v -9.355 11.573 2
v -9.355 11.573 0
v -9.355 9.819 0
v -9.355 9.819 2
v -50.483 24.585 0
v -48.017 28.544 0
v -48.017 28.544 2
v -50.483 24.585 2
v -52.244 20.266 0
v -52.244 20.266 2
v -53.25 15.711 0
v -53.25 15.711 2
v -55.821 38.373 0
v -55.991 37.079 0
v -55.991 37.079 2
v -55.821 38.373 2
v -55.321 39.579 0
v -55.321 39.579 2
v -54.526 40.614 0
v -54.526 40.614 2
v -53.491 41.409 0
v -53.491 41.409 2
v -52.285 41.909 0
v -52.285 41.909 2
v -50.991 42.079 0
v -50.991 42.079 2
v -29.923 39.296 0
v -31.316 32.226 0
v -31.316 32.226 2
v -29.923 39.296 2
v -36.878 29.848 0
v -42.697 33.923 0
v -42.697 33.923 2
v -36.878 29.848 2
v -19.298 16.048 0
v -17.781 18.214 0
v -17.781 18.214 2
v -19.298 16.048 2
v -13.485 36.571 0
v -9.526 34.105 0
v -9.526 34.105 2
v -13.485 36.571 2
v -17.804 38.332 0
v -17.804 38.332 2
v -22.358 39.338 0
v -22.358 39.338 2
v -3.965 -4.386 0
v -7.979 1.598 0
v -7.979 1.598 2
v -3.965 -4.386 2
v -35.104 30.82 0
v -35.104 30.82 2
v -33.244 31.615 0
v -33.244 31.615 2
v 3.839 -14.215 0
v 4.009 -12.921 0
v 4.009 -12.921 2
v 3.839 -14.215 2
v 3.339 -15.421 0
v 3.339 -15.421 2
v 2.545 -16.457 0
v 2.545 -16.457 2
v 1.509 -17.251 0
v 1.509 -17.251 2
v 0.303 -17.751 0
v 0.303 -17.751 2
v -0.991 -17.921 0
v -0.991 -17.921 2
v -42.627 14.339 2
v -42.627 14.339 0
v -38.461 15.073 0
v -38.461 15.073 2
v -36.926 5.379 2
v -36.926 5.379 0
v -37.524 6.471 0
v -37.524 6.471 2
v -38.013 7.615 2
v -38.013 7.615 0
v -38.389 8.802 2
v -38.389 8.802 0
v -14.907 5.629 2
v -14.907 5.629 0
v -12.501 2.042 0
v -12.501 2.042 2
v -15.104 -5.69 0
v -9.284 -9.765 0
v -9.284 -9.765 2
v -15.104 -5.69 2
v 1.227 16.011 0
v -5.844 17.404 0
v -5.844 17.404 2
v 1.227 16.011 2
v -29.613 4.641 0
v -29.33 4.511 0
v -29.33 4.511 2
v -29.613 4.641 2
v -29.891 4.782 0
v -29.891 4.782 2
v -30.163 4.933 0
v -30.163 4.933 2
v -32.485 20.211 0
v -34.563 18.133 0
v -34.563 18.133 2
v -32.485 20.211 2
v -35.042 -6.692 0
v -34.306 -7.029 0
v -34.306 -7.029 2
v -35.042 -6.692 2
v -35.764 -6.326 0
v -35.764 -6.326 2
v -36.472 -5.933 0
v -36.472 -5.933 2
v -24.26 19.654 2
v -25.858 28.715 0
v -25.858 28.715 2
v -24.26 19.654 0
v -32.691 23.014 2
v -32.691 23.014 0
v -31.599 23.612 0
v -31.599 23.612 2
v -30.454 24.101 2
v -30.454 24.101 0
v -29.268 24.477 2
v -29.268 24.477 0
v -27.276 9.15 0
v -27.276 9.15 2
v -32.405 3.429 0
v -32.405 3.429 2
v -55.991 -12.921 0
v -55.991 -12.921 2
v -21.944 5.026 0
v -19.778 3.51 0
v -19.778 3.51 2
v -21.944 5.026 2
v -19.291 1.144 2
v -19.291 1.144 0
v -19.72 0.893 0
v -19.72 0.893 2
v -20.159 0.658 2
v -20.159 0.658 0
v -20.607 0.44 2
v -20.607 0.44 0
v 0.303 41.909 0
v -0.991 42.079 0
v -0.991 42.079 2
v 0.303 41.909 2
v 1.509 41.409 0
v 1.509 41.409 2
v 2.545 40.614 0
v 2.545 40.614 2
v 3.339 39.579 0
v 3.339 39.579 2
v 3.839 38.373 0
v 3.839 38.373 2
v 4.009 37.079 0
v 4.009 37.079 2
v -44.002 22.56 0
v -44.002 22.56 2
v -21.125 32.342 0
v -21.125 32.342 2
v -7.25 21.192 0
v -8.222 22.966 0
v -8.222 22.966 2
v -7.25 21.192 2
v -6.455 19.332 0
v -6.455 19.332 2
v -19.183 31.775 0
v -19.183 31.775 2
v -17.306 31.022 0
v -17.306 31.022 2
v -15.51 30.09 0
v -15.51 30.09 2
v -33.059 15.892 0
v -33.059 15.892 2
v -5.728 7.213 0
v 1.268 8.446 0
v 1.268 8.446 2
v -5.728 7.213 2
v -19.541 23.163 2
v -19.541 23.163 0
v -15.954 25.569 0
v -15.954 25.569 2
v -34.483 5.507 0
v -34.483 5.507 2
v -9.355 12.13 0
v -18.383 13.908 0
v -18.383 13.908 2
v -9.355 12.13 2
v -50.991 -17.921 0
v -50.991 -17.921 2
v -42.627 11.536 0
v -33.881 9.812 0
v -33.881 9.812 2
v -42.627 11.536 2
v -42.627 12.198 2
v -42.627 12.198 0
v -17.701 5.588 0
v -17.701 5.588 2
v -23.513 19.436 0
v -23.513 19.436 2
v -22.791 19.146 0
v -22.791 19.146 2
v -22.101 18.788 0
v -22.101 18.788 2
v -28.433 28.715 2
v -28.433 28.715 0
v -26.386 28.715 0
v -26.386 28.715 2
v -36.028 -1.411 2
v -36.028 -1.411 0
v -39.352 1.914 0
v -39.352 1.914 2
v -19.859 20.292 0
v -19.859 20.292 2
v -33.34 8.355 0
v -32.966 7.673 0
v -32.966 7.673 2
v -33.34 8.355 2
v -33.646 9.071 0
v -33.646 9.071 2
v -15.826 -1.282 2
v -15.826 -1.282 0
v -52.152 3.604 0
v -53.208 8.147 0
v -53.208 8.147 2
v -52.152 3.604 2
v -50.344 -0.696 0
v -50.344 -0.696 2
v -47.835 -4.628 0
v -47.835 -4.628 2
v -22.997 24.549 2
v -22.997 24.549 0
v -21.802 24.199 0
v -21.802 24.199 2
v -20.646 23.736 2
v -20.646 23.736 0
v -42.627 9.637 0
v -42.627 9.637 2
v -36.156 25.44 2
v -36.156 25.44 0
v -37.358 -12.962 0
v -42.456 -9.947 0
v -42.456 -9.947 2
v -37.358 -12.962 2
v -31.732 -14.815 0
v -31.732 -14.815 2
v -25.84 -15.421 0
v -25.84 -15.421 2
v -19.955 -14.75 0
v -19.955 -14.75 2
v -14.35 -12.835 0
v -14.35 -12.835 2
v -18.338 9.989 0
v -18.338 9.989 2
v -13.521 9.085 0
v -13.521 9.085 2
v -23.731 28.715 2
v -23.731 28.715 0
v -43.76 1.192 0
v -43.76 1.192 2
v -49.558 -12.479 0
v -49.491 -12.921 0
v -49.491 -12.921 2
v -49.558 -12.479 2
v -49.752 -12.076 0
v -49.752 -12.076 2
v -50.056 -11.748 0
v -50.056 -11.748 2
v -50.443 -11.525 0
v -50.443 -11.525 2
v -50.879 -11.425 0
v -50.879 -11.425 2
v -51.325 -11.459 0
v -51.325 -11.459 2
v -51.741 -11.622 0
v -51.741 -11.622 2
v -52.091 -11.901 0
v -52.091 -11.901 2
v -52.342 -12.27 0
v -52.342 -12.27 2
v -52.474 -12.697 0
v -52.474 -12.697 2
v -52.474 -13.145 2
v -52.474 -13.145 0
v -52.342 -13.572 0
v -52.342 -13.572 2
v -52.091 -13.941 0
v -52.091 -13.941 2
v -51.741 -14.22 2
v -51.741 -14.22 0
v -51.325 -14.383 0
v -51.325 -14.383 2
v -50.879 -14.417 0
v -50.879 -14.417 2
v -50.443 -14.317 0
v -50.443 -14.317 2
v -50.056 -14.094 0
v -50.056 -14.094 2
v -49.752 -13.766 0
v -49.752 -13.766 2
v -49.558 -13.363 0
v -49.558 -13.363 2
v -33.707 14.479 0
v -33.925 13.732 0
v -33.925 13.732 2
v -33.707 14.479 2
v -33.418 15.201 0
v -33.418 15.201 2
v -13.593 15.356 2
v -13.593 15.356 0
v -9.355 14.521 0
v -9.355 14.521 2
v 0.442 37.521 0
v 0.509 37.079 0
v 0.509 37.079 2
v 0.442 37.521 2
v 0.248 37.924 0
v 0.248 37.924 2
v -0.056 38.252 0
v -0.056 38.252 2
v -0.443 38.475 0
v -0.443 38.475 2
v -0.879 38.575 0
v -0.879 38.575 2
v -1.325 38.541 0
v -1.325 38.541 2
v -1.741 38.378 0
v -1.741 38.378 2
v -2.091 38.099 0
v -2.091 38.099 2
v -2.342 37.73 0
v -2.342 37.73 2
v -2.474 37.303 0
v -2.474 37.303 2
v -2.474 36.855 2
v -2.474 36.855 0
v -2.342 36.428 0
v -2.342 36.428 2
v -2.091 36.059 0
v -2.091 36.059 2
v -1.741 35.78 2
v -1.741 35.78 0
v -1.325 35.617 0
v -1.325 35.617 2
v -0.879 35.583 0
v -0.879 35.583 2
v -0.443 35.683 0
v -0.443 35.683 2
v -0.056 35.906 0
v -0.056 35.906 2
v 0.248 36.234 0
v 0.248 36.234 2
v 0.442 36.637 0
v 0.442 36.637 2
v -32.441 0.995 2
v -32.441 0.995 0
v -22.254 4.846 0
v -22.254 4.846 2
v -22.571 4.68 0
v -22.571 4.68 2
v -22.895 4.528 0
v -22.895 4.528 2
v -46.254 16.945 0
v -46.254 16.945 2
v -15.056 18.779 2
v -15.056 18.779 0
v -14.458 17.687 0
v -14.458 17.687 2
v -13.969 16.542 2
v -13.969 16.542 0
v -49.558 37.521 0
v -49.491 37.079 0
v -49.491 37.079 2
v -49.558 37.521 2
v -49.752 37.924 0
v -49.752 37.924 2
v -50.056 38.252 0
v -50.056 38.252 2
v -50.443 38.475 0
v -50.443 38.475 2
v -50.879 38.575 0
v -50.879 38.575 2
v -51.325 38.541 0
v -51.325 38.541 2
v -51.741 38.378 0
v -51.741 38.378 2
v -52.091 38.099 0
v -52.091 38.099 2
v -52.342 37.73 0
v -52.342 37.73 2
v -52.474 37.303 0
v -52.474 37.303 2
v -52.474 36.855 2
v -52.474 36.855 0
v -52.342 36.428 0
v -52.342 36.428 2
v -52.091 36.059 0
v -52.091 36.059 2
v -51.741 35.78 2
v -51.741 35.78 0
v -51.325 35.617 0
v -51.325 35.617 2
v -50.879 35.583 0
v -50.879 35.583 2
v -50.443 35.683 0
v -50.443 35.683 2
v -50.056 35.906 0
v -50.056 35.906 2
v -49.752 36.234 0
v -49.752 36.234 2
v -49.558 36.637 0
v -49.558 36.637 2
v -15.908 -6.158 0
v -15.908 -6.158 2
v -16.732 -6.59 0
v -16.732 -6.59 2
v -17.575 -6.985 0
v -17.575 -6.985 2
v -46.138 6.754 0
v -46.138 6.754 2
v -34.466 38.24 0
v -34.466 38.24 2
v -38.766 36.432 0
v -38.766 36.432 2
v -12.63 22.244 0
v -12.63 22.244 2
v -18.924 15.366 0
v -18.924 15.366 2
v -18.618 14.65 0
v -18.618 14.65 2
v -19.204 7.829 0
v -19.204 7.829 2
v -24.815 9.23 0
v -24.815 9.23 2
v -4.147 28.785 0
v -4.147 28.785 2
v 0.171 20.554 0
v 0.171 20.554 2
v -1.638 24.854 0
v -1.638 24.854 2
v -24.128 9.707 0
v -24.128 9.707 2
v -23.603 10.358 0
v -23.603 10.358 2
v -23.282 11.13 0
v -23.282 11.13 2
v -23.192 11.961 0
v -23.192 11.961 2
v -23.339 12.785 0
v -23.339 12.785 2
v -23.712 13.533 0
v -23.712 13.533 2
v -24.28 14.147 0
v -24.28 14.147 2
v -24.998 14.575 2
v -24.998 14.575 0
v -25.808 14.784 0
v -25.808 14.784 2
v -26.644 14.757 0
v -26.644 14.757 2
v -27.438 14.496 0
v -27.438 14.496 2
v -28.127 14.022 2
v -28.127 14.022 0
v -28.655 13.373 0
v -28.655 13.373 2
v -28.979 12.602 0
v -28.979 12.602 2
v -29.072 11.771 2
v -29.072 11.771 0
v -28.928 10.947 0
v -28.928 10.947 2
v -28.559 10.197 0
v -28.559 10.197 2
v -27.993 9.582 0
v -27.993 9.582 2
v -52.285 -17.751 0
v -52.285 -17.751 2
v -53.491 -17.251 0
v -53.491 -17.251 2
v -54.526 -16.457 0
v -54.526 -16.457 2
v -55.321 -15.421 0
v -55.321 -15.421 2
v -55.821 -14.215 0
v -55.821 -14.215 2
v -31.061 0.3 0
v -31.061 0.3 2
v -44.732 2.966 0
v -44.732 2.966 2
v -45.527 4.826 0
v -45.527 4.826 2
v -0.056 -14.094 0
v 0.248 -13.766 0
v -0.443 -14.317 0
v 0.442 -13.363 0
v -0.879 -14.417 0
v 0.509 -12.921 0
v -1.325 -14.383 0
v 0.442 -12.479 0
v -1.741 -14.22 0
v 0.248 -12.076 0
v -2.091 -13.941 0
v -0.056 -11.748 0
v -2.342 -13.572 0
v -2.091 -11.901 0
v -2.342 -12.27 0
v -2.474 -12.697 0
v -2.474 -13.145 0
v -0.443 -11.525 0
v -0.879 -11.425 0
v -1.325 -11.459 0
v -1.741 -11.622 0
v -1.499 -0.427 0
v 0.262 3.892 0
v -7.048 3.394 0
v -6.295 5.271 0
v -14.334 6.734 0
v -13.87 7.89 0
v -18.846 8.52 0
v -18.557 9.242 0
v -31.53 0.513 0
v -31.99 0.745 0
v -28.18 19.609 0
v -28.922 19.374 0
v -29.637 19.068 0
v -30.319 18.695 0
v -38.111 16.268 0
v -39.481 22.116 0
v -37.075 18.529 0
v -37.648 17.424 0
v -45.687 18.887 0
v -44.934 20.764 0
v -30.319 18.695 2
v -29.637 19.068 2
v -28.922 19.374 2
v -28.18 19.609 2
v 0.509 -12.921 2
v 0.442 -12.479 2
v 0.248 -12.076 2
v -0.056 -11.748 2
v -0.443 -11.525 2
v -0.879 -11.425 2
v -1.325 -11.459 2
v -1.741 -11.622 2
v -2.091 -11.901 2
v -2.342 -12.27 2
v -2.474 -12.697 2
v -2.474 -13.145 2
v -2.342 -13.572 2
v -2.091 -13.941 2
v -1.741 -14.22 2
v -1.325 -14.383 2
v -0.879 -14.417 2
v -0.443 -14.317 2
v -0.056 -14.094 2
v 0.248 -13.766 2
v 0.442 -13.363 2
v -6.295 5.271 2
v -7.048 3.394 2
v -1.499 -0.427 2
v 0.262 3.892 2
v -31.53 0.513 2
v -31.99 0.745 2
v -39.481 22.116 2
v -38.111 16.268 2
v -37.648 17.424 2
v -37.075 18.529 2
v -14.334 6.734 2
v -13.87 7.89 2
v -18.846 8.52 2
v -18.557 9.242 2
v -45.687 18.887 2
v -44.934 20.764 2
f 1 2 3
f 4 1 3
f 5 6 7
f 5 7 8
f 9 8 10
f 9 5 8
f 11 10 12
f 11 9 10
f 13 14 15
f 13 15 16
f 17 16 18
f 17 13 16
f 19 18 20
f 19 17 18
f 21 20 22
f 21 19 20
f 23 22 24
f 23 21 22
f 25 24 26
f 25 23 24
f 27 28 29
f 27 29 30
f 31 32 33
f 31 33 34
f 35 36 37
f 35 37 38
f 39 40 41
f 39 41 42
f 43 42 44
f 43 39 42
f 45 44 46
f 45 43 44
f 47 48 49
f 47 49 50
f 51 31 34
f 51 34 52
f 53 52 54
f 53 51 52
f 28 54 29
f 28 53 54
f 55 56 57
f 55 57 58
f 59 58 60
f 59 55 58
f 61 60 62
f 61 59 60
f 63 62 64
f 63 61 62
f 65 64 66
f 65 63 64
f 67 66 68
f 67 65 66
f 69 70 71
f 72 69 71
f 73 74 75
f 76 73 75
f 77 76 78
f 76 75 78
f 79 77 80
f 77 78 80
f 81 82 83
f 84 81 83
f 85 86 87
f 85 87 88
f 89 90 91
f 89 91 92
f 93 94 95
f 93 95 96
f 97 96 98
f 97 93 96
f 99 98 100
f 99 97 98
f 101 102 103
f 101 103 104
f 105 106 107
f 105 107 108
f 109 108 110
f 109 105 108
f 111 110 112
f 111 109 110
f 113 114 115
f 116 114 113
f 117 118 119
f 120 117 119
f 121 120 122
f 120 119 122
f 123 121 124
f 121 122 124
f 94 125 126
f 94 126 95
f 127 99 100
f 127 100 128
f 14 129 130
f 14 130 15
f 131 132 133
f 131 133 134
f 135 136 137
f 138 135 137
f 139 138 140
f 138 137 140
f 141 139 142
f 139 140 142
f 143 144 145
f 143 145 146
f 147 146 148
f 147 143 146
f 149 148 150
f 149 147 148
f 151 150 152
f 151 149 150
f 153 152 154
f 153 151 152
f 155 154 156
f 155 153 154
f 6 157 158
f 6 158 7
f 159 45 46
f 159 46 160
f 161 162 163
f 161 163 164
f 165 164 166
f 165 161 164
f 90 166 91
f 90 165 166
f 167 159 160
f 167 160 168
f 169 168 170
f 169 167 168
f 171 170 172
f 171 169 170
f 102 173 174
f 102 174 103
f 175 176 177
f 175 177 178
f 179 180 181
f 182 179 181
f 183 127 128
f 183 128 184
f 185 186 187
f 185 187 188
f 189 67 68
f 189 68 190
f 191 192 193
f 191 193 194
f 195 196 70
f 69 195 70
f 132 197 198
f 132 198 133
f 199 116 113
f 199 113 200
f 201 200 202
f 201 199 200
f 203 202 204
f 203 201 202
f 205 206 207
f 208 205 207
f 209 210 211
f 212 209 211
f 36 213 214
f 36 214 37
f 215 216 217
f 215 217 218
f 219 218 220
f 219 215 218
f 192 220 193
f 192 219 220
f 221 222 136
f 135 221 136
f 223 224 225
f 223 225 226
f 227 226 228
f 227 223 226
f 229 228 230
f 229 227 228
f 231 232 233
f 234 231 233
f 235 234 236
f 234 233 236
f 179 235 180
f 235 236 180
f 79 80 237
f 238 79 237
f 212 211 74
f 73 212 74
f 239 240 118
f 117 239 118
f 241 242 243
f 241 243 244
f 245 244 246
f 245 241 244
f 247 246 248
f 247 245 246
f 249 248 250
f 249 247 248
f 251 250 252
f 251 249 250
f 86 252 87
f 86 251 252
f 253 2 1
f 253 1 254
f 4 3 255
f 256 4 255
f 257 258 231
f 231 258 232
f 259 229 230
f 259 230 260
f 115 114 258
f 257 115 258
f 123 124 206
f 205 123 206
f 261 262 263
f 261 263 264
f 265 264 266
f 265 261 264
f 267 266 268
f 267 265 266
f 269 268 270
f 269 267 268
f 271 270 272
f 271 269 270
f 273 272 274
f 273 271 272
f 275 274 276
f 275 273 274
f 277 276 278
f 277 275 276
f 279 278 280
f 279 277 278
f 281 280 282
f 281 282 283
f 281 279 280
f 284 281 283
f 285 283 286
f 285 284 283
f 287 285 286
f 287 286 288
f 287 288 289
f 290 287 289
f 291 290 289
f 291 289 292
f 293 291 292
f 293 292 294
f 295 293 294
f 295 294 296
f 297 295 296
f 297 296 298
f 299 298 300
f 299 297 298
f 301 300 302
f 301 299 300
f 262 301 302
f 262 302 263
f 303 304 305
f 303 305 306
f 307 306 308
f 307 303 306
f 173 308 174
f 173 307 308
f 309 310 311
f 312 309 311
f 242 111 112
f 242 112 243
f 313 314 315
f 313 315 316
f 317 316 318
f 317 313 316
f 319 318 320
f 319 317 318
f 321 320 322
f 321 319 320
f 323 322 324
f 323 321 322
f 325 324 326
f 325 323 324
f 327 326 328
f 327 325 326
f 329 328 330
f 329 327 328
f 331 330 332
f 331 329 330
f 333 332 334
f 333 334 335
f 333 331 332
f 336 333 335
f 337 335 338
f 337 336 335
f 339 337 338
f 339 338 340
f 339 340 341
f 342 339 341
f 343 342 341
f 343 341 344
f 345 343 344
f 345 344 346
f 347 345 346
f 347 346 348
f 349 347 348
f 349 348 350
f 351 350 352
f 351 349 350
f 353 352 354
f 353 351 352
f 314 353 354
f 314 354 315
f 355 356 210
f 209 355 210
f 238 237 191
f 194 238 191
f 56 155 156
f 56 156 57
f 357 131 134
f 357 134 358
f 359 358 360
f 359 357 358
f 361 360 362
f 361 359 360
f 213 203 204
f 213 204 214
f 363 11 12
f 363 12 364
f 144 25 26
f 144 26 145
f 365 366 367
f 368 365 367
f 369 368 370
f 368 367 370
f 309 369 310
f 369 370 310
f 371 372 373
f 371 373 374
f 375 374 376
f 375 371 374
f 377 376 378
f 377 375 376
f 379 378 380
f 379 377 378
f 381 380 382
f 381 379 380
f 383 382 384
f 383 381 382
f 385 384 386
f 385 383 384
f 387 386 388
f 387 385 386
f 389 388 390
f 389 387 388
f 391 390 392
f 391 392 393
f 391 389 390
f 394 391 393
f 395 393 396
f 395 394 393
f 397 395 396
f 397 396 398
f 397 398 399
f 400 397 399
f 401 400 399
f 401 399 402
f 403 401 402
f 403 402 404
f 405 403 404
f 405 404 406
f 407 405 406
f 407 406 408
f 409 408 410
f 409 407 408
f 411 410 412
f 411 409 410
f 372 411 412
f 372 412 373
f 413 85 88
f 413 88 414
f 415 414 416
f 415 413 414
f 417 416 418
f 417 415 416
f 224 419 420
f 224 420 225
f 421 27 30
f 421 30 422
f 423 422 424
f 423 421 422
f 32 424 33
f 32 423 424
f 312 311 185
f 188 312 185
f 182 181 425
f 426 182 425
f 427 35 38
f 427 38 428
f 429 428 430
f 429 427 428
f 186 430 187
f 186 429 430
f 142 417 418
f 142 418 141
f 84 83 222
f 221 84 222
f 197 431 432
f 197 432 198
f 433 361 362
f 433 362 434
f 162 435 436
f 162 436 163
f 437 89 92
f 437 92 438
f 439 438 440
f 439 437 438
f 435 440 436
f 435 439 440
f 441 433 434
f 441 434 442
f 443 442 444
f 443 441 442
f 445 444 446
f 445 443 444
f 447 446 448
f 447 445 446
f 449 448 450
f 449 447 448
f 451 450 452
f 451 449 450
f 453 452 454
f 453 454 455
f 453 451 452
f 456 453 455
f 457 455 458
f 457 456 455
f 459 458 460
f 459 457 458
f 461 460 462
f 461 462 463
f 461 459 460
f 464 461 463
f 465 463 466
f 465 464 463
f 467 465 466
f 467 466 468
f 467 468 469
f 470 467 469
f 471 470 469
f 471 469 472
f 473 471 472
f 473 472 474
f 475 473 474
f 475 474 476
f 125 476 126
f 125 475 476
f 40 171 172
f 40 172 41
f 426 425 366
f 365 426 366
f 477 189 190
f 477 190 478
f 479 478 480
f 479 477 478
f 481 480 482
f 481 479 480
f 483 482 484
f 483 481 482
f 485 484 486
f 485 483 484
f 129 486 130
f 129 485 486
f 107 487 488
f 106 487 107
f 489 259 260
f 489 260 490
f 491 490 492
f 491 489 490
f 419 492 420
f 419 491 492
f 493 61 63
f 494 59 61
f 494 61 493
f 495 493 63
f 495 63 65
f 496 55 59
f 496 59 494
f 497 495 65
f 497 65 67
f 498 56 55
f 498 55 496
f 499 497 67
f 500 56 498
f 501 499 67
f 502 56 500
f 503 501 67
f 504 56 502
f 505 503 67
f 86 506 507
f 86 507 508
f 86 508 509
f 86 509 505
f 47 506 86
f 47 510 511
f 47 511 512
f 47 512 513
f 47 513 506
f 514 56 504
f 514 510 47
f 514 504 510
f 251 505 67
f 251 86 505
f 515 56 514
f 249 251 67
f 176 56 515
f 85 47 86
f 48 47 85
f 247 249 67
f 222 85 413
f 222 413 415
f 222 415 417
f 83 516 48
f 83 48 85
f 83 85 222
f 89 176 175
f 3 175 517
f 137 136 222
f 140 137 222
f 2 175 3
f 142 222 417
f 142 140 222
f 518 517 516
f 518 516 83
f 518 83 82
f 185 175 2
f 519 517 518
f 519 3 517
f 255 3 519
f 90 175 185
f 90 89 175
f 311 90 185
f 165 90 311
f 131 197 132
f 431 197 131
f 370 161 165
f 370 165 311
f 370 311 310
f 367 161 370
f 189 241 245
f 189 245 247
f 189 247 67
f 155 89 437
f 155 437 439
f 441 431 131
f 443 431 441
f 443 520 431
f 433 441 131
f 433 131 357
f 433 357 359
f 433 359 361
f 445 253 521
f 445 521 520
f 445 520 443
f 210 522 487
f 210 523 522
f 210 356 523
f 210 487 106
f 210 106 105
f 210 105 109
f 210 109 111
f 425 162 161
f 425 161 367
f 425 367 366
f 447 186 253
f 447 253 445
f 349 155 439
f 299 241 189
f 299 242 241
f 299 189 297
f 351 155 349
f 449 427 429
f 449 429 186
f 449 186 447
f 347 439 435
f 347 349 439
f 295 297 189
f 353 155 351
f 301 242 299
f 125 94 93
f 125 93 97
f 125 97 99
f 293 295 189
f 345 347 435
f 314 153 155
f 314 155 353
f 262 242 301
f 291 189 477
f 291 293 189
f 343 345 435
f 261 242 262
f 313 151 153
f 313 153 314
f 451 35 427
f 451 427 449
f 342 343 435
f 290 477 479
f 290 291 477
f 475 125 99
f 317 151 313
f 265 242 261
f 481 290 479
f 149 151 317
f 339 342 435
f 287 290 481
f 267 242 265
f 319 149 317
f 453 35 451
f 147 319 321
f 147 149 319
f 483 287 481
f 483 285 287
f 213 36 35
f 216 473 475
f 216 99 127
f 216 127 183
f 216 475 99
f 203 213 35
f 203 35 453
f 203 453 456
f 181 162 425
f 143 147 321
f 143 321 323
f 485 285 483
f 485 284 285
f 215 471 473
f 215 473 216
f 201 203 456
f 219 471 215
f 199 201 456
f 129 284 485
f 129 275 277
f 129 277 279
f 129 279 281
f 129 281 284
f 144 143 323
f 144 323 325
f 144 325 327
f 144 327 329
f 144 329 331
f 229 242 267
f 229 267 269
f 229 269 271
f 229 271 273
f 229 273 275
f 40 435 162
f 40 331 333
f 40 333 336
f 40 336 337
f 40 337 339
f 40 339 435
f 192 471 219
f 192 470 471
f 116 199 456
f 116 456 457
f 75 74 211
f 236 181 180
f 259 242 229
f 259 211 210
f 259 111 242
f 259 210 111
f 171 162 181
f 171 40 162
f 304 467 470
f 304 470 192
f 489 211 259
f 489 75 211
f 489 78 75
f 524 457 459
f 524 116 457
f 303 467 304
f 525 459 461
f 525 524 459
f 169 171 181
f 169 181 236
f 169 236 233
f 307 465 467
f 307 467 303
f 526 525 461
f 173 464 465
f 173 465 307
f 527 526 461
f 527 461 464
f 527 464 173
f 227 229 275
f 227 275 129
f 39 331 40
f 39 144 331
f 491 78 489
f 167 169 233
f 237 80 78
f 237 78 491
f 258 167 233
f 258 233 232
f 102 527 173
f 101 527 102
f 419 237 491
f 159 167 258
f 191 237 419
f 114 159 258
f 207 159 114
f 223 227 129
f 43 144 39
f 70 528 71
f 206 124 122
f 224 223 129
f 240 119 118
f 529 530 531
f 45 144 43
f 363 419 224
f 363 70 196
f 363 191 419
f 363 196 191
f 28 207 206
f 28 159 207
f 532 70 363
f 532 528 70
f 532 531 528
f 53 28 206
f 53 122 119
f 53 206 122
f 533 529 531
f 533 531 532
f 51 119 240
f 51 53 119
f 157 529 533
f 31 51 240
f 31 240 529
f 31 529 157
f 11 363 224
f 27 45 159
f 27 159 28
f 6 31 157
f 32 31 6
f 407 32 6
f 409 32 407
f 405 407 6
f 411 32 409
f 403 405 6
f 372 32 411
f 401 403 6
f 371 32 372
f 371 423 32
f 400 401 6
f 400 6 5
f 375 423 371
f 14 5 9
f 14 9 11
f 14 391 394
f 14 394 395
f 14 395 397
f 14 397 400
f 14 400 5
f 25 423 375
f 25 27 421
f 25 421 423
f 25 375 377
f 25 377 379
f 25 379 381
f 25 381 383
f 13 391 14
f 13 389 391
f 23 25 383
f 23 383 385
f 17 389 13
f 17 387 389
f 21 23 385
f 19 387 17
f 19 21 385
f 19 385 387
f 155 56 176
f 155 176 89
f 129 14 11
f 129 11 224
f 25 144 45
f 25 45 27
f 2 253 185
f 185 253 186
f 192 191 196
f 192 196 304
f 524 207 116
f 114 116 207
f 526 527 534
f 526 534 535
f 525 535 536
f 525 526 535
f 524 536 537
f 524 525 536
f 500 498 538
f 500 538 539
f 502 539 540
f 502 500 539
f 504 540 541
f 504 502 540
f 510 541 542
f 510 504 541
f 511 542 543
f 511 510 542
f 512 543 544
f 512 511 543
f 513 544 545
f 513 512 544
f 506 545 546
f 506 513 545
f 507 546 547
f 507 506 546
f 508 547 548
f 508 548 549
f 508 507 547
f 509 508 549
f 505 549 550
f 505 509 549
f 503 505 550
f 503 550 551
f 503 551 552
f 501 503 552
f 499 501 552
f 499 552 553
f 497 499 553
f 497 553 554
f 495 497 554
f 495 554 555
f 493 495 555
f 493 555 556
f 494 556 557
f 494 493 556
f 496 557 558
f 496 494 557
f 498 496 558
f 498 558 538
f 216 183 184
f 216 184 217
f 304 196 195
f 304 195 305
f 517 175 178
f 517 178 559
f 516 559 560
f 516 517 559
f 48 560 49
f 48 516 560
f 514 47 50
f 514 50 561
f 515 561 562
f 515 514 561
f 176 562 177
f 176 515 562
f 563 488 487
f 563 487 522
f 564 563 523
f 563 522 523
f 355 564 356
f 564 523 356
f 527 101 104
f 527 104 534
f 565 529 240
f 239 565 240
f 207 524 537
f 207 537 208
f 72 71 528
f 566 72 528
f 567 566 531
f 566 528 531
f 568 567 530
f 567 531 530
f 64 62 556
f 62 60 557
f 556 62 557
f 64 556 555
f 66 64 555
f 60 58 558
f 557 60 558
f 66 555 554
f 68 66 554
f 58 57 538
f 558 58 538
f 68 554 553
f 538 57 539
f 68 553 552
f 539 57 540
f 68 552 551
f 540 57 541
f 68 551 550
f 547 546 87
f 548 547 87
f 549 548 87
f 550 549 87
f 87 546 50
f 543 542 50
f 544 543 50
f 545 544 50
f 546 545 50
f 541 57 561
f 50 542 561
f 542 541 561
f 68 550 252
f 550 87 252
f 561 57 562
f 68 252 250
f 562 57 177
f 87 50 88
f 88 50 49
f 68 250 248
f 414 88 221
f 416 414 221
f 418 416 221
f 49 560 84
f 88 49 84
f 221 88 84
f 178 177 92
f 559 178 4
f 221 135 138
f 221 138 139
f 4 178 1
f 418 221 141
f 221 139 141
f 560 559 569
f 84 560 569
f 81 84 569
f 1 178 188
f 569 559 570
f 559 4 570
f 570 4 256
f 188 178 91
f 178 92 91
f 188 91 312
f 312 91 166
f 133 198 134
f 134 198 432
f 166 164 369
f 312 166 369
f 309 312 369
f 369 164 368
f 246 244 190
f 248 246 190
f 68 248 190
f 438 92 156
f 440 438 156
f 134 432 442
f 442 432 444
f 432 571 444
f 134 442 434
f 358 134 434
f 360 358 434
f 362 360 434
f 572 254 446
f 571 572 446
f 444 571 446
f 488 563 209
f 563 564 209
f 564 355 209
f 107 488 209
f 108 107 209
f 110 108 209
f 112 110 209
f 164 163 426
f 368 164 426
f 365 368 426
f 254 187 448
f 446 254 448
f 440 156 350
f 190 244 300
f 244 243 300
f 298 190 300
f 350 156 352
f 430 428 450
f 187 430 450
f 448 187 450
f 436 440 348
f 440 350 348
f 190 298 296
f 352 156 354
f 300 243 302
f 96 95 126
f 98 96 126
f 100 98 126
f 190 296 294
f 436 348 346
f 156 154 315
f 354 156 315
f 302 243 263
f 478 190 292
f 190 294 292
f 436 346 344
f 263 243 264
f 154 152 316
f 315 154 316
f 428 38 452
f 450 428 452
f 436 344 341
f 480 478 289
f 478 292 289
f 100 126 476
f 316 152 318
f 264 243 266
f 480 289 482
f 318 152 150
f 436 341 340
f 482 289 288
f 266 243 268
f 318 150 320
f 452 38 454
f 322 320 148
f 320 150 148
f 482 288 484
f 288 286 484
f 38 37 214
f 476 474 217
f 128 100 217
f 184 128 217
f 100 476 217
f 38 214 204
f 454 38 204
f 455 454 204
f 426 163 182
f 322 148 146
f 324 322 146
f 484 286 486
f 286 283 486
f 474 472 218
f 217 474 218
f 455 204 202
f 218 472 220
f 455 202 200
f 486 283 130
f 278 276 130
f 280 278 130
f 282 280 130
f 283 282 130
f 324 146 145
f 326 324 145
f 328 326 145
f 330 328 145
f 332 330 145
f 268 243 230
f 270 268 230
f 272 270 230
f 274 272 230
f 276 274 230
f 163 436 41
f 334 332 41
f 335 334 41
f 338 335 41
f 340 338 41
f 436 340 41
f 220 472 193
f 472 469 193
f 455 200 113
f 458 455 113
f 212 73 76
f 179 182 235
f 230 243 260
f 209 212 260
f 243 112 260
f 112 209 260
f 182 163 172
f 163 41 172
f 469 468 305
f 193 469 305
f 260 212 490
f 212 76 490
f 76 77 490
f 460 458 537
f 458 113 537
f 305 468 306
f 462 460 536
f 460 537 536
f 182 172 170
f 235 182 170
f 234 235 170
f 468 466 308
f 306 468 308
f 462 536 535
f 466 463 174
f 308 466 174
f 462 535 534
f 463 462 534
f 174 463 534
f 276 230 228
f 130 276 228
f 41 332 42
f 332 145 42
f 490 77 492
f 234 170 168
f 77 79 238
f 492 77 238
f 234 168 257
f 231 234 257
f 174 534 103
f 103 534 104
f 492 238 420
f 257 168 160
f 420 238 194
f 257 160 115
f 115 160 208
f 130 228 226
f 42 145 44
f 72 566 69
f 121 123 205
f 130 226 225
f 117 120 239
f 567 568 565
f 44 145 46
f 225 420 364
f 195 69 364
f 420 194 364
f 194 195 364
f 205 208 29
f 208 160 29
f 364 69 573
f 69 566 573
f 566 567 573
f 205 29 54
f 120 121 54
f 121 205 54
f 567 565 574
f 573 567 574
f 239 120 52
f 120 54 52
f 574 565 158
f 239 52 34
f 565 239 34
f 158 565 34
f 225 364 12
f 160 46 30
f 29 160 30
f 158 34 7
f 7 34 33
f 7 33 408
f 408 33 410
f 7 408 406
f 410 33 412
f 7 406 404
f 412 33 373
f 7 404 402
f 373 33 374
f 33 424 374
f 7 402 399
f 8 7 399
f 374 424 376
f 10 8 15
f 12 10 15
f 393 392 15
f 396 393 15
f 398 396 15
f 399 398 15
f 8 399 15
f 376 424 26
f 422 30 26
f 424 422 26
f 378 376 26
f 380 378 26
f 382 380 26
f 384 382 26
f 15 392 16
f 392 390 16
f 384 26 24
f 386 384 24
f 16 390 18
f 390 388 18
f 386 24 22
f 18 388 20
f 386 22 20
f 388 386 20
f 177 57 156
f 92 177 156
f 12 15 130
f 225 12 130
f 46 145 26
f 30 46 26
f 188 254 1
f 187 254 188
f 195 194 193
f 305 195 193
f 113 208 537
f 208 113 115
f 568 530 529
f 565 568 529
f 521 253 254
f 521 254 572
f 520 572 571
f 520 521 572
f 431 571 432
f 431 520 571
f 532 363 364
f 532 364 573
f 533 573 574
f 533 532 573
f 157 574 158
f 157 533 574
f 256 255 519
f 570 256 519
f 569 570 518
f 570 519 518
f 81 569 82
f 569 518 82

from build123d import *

# Parameters (mm, degrees)
SCHIZZO1_R                   = 1.5
ESTRUSIONE_ESTRUSIONE1_DEPTH = 2
TAGLIO_ESTRUSIONE1_DEPTH     = 2
ESTRUSIONE_ESTRUSIONE2_DEPTH = 2


with BuildPart() as part:
    # Schizzo1 → Estrusione-Estrusione1 (new body)
    with BuildSketch(Plane.XY):
        with BuildLine():
            Line((4.009057919, 37.078949925), (4.009057919, -12.921050075))
            ThreePointArc((4.009057919, -12.921050075), (2.544591824, -16.456583981), (-0.990942081, -17.921050075))
            Line((-0.990942081, -17.921050075), (-50.990942081, -17.921050075))
            ThreePointArc((-50.990942081, -17.921050075), (-54.526475987, -16.456583981), (-55.990942081, -12.921050075))
            Line((-55.990942081, -12.921050075), (-55.990942081, 37.078949925))
            ThreePointArc((-55.990942081, 37.078949925), (-54.526475987, 40.614483831), (-50.990942081, 42.078949925))
            Line((-50.990942081, 42.078949925), (-0.990942081, 42.078949925))
            ThreePointArc((-0.990942081, 42.078949925), (2.544591824, 40.614483831), (4.009057919, 37.078949925))
        make_face()
        with Locations((-50.990942081, 37.078949925)):
            Circle(SCHIZZO1_R, mode=Mode.SUBTRACT)
        with Locations((-0.990942081, 37.078949925)):
            Circle(SCHIZZO1_R, mode=Mode.SUBTRACT)
        with Locations((-50.990942081, -12.921050075)):
            Circle(SCHIZZO1_R, mode=Mode.SUBTRACT)
        with Locations((-0.990942081, -12.921050075)):
            Circle(SCHIZZO1_R, mode=Mode.SUBTRACT)
        with BuildLine():
            Line((-31.315733716, 32.226325066), (-29.922818488, 39.296413949))
            ThreePointArc((-29.922818488, 39.296413949), (-36.65420027, 37.427419796), (-42.697428035, 33.922560594))
            Line((-42.697428035, 33.922560594), (-36.878383255, 29.847848476))
            ThreePointArc((-36.878383255, 29.847848476), (-34.183829904, 31.240022968), (-31.315733716, 32.226325066))
        make_face(mode=Mode.SUBTRACT)
        with BuildLine():
            Line((-22.358446359, 39.337984663), (-21.125016906, 32.342042069))
            ThreePointArc((-21.125016906, 32.342042069), (-18.235263935, 31.421121146), (-15.509792769, 30.090491783))
            Line((-15.509792769, 30.090491783), (-9.525545173, 34.104859773))
            ThreePointArc((-9.525545173, 34.104859773), (-15.606929318, 37.543087038), (-22.358446359, 39.337984663))
        make_face(mode=Mode.SUBTRACT)
        with BuildLine():
            Line((-4.147331412, 28.785435879), (-8.22204353, 22.966391099))
            ThreePointArc((-8.22204353, 22.966391099), (-6.829869038, 20.271837748), (-5.84356694, 17.403741559))
            Line((-5.84356694, 17.403741559), (1.226521943, 16.010826332))
            ThreePointArc((1.226521943, 16.010826332), (-0.642472211, 22.742208114), (-4.147331412, 28.785435879))
        make_face(mode=Mode.SUBTRACT)
        with BuildLine():
            Line((1.268092656, 8.446454203), (-5.727849938, 7.213024749))
            ThreePointArc((-5.727849938, 7.213024749), (-6.648770861, 4.323271778), (-7.979400223, 1.597800612))
            Line((-7.979400223, 1.597800612), (-3.965032233, -4.386446983))
            ThreePointArc((-3.965032233, -4.386446983), (-0.526804968, 1.694937161), (1.268092656, 8.446454203))
        make_face(mode=Mode.SUBTRACT)
        with BuildLine():
            Line((-9.284456128, -9.764660744), (-15.103500908, -5.689948626))
            ThreePointArc((-15.103500908, -5.689948626), (-16.317583854, -6.379009649), (-17.575076336, -6.985239929))
            Line((-17.575076336, -6.985239929), (-22.566296054, 5.239602614))
            ThreePointArc((-22.566296054, 5.239602614), (-26.23827157, 19.723797875), (-28.966350145, 5.032545245))
            Line((-28.966350145, 5.032545245), (-34.305917557, -7.029459582))
            ThreePointArc((-34.305917557, -7.029459582), (-35.404993092, -6.512601237), (-36.472091394, -5.932591934))
            Line((-36.472091394, -5.932591934), (-42.45633899, -9.946959923))
            ThreePointArc((-42.45633899, -9.946959923), (-25.839815546, -15.420634813), (-9.284456128, -9.764660744))
        make_face(mode=Mode.SUBTRACT)
        with BuildLine():
            Line((-47.834552751, -4.627536029), (-43.759840633, 1.191508751))
            ThreePointArc((-43.759840633, 1.191508751), (-45.152015125, 3.886062102), (-46.138317223, 6.754158291))
            Line((-46.138317223, 6.754158291), (-53.208406106, 8.147073518))
            ThreePointArc((-53.208406106, 8.147073518), (-51.339411952, 1.415691736), (-47.834552751, -4.627536029))
        make_face(mode=Mode.SUBTRACT)
        with BuildLine():
            Line((-53.249976819, 15.711445647), (-46.254034225, 16.944875101))
            ThreePointArc((-46.254034225, 16.944875101), (-45.333113302, 19.834628071), (-44.00248394, 22.560099238))
            Line((-44.00248394, 22.560099238), (-48.01685193, 28.544346833))
            ThreePointArc((-48.01685193, 28.544346833), (-51.455079195, 22.462962688), (-53.249976819, 15.711445647))
        make_face(mode=Mode.SUBTRACT)
    extrude(amount=ESTRUSIONE_ESTRUSIONE1_DEPTH)

    # Schizzo2 → Taglio-Estrusione1 (cut)
    with BuildSketch(Plane.XY):
        with BuildLine():
            Line((-29.267736933, 24.477334627), (-28.432897549, 28.714770282))
            Line((-28.432897549, 28.714770282), (-23.731058754, 28.714770282))
            Line((-23.731058754, 28.714770282), (-22.996526589, 24.54854509))
            ThreePointArc((-22.996526589, 24.54854509), (-21.218217068, 23.981824522), (-19.541004043, 23.162975684))
            Line((-19.541004043, 23.162975684), (-15.954363967, 25.56897458))
            Line((-15.954363967, 25.56897458), (-12.629661871, 22.244272484))
            Line((-12.629661871, 22.244272484), (-15.056235281, 18.778913724))
            ThreePointArc((-15.056235281, 18.778913724), (-14.199512517, 17.120727047), (-13.592557379, 15.355744777))
            Line((-13.592557379, 15.355744777), (-9.355121725, 14.520905393))
            Line((-9.355121725, 14.520905393), (-9.355121725, 9.819066597))
            Line((-9.355121725, 9.819066597), (-13.521346916, 9.084534432))
            ThreePointArc((-13.521346916, 9.084534432), (-14.088067484, 7.306224912), (-14.906916322, 5.629011886))
            Line((-14.906916322, 5.629011886), (-12.500917426, 2.042371811))
            Line((-12.500917426, 2.042371811), (-15.825619522, -1.282330286))
            Line((-15.825619522, -1.282330286), (-19.290978282, 1.144243124))
            ThreePointArc((-19.290978282, 1.144243124), (-20.038106249, 0.720205572), (-20.811947777, 0.347140784))
            Line((-20.811947777, 0.347140784), (-23.883467603, 7.870120811))
            ThreePointArc((-23.883467603, 7.870120811), (-26.524135322, 16.755636376), (-27.096941459, 7.503749758))
            Line((-27.096941459, 7.503749758), (-30.402118498, 0.037403083))
            ThreePointArc((-30.402118498, 0.037403083), (-31.442562341, 0.471316046), (-32.44088012, 0.994924166))
            Line((-32.44088012, 0.994924166), (-36.027520196, -1.411074731))
            Line((-36.027520196, -1.411074731), (-39.352222292, 1.913627366))
            Line((-39.352222292, 1.913627366), (-36.925648882, 5.378986126))
            ThreePointArc((-36.925648882, 5.378986126), (-37.782371646, 7.037172803), (-38.389326784, 8.802155073))
            Line((-38.389326784, 8.802155073), (-42.626762438, 9.636994457))
            Line((-42.626762438, 9.636994457), (-42.626762438, 14.338833252))
            Line((-42.626762438, 14.338833252), (-38.460537247, 15.073365418))
            ThreePointArc((-38.460537247, 15.073365418), (-37.893816679, 16.851674938), (-37.074967841, 18.528887964))
            Line((-37.074967841, 18.528887964), (-39.480966737, 22.115528039))
            Line((-39.480966737, 22.115528039), (-36.156264641, 25.440230135))
            Line((-36.156264641, 25.440230135), (-32.690905881, 23.013656726))
            ThreePointArc((-32.690905881, 23.013656726), (-31.032719203, 23.87037949), (-29.267736933, 24.477334627))
        make_face()
    extrude(amount=TAGLIO_ESTRUSIONE1_DEPTH, mode=Mode.SUBTRACT)

    # Schizzo3 → Estrusione-Estrusione2 (add)
    with BuildSketch(Plane.XY):
        with BuildLine():
            Line((-28.179815713, 19.609421722), (-26.38592332, 28.714770282))
            Line((-26.38592332, 28.714770282), (-25.857793685, 28.714770282))
            Line((-25.857793685, 28.714770282), (-24.260309247, 19.653928262))
            ThreePointArc((-24.260309247, 19.653928262), (-23.148865797, 19.299727906), (-22.100607656, 18.787947383))
            Line((-22.100607656, 18.787947383), (-19.858957609, 20.291696693))
            Line((-19.858957609, 20.291696693), (-17.781018799, 18.213757883))
            Line((-17.781018799, 18.213757883), (-19.29762718, 16.047908658))
            ThreePointArc((-19.29762718, 16.047908658), (-18.762175452, 15.011541984), (-18.382828491, 13.908428066))
            Line((-18.382828491, 13.908428066), (-9.355121725, 12.129832289))
            Line((-9.355121725, 12.129832289), (-9.355121725, 11.572717293))
            Line((-9.355121725, 11.572717293), (-18.338321952, 9.9889216))
            ThreePointArc((-18.338321952, 9.9889216), (-18.692522307, 8.87747815), (-19.204302831, 7.829220009))
            Line((-19.204302831, 7.829220009), (-17.70055352, 5.587569962))
            Line((-17.70055352, 5.587569962), (-19.778492331, 3.509631152))
            Line((-19.778492331, 3.509631152), (-21.944341556, 5.026239533))
            ThreePointArc((-21.944341556, 5.026239533), (-22.411296535, 4.761216062), (-22.89494749, 4.52805057))
            Line((-22.89494749, 4.52805057), (-24.814647381, 9.229913087))
            ThreePointArc((-24.814647381, 9.229913087), (-26.226945656, 14.800757418), (-27.276206647, 9.150275637))
            Line((-27.276206647, 9.150275637), (-29.329886421, 4.511043011))
            ThreePointArc((-29.329886421, 4.511043011), (-29.75260778, 4.709834682), (-30.163030204, 4.932915184))
            Line((-30.163030204, 4.932915184), (-32.404680252, 3.429165873))
            Line((-32.404680252, 3.429165873), (-34.482619062, 5.507104684))
            Line((-34.482619062, 5.507104684), (-32.966010681, 7.672953909))
            ThreePointArc((-32.966010681, 7.672953909), (-33.501462408, 8.709320582), (-33.880809369, 9.812434501))
            Line((-33.880809369, 9.812434501), (-42.626762438, 11.535520506))
            Line((-42.626762438, 11.535520506), (-42.626762438, 12.197820253))
            Line((-42.626762438, 12.197820253), (-33.925315908, 13.731940966))
            ThreePointArc((-33.925315908, 13.731940966), (-33.571115553, 14.843384416), (-33.05933503, 15.891642557))
            Line((-33.05933503, 15.891642557), (-34.56308434, 18.133292605))
            Line((-34.56308434, 18.133292605), (-32.48514553, 20.211231415))
            Line((-32.48514553, 20.211231415), (-30.319296305, 18.694623034))
            ThreePointArc((-30.319296305, 18.694623034), (-29.282929631, 19.230074761), (-28.179815713, 19.609421722))
        make_face()
    extrude(amount=ESTRUSIONE_ESTRUSIONE2_DEPTH)


solid = part.part
